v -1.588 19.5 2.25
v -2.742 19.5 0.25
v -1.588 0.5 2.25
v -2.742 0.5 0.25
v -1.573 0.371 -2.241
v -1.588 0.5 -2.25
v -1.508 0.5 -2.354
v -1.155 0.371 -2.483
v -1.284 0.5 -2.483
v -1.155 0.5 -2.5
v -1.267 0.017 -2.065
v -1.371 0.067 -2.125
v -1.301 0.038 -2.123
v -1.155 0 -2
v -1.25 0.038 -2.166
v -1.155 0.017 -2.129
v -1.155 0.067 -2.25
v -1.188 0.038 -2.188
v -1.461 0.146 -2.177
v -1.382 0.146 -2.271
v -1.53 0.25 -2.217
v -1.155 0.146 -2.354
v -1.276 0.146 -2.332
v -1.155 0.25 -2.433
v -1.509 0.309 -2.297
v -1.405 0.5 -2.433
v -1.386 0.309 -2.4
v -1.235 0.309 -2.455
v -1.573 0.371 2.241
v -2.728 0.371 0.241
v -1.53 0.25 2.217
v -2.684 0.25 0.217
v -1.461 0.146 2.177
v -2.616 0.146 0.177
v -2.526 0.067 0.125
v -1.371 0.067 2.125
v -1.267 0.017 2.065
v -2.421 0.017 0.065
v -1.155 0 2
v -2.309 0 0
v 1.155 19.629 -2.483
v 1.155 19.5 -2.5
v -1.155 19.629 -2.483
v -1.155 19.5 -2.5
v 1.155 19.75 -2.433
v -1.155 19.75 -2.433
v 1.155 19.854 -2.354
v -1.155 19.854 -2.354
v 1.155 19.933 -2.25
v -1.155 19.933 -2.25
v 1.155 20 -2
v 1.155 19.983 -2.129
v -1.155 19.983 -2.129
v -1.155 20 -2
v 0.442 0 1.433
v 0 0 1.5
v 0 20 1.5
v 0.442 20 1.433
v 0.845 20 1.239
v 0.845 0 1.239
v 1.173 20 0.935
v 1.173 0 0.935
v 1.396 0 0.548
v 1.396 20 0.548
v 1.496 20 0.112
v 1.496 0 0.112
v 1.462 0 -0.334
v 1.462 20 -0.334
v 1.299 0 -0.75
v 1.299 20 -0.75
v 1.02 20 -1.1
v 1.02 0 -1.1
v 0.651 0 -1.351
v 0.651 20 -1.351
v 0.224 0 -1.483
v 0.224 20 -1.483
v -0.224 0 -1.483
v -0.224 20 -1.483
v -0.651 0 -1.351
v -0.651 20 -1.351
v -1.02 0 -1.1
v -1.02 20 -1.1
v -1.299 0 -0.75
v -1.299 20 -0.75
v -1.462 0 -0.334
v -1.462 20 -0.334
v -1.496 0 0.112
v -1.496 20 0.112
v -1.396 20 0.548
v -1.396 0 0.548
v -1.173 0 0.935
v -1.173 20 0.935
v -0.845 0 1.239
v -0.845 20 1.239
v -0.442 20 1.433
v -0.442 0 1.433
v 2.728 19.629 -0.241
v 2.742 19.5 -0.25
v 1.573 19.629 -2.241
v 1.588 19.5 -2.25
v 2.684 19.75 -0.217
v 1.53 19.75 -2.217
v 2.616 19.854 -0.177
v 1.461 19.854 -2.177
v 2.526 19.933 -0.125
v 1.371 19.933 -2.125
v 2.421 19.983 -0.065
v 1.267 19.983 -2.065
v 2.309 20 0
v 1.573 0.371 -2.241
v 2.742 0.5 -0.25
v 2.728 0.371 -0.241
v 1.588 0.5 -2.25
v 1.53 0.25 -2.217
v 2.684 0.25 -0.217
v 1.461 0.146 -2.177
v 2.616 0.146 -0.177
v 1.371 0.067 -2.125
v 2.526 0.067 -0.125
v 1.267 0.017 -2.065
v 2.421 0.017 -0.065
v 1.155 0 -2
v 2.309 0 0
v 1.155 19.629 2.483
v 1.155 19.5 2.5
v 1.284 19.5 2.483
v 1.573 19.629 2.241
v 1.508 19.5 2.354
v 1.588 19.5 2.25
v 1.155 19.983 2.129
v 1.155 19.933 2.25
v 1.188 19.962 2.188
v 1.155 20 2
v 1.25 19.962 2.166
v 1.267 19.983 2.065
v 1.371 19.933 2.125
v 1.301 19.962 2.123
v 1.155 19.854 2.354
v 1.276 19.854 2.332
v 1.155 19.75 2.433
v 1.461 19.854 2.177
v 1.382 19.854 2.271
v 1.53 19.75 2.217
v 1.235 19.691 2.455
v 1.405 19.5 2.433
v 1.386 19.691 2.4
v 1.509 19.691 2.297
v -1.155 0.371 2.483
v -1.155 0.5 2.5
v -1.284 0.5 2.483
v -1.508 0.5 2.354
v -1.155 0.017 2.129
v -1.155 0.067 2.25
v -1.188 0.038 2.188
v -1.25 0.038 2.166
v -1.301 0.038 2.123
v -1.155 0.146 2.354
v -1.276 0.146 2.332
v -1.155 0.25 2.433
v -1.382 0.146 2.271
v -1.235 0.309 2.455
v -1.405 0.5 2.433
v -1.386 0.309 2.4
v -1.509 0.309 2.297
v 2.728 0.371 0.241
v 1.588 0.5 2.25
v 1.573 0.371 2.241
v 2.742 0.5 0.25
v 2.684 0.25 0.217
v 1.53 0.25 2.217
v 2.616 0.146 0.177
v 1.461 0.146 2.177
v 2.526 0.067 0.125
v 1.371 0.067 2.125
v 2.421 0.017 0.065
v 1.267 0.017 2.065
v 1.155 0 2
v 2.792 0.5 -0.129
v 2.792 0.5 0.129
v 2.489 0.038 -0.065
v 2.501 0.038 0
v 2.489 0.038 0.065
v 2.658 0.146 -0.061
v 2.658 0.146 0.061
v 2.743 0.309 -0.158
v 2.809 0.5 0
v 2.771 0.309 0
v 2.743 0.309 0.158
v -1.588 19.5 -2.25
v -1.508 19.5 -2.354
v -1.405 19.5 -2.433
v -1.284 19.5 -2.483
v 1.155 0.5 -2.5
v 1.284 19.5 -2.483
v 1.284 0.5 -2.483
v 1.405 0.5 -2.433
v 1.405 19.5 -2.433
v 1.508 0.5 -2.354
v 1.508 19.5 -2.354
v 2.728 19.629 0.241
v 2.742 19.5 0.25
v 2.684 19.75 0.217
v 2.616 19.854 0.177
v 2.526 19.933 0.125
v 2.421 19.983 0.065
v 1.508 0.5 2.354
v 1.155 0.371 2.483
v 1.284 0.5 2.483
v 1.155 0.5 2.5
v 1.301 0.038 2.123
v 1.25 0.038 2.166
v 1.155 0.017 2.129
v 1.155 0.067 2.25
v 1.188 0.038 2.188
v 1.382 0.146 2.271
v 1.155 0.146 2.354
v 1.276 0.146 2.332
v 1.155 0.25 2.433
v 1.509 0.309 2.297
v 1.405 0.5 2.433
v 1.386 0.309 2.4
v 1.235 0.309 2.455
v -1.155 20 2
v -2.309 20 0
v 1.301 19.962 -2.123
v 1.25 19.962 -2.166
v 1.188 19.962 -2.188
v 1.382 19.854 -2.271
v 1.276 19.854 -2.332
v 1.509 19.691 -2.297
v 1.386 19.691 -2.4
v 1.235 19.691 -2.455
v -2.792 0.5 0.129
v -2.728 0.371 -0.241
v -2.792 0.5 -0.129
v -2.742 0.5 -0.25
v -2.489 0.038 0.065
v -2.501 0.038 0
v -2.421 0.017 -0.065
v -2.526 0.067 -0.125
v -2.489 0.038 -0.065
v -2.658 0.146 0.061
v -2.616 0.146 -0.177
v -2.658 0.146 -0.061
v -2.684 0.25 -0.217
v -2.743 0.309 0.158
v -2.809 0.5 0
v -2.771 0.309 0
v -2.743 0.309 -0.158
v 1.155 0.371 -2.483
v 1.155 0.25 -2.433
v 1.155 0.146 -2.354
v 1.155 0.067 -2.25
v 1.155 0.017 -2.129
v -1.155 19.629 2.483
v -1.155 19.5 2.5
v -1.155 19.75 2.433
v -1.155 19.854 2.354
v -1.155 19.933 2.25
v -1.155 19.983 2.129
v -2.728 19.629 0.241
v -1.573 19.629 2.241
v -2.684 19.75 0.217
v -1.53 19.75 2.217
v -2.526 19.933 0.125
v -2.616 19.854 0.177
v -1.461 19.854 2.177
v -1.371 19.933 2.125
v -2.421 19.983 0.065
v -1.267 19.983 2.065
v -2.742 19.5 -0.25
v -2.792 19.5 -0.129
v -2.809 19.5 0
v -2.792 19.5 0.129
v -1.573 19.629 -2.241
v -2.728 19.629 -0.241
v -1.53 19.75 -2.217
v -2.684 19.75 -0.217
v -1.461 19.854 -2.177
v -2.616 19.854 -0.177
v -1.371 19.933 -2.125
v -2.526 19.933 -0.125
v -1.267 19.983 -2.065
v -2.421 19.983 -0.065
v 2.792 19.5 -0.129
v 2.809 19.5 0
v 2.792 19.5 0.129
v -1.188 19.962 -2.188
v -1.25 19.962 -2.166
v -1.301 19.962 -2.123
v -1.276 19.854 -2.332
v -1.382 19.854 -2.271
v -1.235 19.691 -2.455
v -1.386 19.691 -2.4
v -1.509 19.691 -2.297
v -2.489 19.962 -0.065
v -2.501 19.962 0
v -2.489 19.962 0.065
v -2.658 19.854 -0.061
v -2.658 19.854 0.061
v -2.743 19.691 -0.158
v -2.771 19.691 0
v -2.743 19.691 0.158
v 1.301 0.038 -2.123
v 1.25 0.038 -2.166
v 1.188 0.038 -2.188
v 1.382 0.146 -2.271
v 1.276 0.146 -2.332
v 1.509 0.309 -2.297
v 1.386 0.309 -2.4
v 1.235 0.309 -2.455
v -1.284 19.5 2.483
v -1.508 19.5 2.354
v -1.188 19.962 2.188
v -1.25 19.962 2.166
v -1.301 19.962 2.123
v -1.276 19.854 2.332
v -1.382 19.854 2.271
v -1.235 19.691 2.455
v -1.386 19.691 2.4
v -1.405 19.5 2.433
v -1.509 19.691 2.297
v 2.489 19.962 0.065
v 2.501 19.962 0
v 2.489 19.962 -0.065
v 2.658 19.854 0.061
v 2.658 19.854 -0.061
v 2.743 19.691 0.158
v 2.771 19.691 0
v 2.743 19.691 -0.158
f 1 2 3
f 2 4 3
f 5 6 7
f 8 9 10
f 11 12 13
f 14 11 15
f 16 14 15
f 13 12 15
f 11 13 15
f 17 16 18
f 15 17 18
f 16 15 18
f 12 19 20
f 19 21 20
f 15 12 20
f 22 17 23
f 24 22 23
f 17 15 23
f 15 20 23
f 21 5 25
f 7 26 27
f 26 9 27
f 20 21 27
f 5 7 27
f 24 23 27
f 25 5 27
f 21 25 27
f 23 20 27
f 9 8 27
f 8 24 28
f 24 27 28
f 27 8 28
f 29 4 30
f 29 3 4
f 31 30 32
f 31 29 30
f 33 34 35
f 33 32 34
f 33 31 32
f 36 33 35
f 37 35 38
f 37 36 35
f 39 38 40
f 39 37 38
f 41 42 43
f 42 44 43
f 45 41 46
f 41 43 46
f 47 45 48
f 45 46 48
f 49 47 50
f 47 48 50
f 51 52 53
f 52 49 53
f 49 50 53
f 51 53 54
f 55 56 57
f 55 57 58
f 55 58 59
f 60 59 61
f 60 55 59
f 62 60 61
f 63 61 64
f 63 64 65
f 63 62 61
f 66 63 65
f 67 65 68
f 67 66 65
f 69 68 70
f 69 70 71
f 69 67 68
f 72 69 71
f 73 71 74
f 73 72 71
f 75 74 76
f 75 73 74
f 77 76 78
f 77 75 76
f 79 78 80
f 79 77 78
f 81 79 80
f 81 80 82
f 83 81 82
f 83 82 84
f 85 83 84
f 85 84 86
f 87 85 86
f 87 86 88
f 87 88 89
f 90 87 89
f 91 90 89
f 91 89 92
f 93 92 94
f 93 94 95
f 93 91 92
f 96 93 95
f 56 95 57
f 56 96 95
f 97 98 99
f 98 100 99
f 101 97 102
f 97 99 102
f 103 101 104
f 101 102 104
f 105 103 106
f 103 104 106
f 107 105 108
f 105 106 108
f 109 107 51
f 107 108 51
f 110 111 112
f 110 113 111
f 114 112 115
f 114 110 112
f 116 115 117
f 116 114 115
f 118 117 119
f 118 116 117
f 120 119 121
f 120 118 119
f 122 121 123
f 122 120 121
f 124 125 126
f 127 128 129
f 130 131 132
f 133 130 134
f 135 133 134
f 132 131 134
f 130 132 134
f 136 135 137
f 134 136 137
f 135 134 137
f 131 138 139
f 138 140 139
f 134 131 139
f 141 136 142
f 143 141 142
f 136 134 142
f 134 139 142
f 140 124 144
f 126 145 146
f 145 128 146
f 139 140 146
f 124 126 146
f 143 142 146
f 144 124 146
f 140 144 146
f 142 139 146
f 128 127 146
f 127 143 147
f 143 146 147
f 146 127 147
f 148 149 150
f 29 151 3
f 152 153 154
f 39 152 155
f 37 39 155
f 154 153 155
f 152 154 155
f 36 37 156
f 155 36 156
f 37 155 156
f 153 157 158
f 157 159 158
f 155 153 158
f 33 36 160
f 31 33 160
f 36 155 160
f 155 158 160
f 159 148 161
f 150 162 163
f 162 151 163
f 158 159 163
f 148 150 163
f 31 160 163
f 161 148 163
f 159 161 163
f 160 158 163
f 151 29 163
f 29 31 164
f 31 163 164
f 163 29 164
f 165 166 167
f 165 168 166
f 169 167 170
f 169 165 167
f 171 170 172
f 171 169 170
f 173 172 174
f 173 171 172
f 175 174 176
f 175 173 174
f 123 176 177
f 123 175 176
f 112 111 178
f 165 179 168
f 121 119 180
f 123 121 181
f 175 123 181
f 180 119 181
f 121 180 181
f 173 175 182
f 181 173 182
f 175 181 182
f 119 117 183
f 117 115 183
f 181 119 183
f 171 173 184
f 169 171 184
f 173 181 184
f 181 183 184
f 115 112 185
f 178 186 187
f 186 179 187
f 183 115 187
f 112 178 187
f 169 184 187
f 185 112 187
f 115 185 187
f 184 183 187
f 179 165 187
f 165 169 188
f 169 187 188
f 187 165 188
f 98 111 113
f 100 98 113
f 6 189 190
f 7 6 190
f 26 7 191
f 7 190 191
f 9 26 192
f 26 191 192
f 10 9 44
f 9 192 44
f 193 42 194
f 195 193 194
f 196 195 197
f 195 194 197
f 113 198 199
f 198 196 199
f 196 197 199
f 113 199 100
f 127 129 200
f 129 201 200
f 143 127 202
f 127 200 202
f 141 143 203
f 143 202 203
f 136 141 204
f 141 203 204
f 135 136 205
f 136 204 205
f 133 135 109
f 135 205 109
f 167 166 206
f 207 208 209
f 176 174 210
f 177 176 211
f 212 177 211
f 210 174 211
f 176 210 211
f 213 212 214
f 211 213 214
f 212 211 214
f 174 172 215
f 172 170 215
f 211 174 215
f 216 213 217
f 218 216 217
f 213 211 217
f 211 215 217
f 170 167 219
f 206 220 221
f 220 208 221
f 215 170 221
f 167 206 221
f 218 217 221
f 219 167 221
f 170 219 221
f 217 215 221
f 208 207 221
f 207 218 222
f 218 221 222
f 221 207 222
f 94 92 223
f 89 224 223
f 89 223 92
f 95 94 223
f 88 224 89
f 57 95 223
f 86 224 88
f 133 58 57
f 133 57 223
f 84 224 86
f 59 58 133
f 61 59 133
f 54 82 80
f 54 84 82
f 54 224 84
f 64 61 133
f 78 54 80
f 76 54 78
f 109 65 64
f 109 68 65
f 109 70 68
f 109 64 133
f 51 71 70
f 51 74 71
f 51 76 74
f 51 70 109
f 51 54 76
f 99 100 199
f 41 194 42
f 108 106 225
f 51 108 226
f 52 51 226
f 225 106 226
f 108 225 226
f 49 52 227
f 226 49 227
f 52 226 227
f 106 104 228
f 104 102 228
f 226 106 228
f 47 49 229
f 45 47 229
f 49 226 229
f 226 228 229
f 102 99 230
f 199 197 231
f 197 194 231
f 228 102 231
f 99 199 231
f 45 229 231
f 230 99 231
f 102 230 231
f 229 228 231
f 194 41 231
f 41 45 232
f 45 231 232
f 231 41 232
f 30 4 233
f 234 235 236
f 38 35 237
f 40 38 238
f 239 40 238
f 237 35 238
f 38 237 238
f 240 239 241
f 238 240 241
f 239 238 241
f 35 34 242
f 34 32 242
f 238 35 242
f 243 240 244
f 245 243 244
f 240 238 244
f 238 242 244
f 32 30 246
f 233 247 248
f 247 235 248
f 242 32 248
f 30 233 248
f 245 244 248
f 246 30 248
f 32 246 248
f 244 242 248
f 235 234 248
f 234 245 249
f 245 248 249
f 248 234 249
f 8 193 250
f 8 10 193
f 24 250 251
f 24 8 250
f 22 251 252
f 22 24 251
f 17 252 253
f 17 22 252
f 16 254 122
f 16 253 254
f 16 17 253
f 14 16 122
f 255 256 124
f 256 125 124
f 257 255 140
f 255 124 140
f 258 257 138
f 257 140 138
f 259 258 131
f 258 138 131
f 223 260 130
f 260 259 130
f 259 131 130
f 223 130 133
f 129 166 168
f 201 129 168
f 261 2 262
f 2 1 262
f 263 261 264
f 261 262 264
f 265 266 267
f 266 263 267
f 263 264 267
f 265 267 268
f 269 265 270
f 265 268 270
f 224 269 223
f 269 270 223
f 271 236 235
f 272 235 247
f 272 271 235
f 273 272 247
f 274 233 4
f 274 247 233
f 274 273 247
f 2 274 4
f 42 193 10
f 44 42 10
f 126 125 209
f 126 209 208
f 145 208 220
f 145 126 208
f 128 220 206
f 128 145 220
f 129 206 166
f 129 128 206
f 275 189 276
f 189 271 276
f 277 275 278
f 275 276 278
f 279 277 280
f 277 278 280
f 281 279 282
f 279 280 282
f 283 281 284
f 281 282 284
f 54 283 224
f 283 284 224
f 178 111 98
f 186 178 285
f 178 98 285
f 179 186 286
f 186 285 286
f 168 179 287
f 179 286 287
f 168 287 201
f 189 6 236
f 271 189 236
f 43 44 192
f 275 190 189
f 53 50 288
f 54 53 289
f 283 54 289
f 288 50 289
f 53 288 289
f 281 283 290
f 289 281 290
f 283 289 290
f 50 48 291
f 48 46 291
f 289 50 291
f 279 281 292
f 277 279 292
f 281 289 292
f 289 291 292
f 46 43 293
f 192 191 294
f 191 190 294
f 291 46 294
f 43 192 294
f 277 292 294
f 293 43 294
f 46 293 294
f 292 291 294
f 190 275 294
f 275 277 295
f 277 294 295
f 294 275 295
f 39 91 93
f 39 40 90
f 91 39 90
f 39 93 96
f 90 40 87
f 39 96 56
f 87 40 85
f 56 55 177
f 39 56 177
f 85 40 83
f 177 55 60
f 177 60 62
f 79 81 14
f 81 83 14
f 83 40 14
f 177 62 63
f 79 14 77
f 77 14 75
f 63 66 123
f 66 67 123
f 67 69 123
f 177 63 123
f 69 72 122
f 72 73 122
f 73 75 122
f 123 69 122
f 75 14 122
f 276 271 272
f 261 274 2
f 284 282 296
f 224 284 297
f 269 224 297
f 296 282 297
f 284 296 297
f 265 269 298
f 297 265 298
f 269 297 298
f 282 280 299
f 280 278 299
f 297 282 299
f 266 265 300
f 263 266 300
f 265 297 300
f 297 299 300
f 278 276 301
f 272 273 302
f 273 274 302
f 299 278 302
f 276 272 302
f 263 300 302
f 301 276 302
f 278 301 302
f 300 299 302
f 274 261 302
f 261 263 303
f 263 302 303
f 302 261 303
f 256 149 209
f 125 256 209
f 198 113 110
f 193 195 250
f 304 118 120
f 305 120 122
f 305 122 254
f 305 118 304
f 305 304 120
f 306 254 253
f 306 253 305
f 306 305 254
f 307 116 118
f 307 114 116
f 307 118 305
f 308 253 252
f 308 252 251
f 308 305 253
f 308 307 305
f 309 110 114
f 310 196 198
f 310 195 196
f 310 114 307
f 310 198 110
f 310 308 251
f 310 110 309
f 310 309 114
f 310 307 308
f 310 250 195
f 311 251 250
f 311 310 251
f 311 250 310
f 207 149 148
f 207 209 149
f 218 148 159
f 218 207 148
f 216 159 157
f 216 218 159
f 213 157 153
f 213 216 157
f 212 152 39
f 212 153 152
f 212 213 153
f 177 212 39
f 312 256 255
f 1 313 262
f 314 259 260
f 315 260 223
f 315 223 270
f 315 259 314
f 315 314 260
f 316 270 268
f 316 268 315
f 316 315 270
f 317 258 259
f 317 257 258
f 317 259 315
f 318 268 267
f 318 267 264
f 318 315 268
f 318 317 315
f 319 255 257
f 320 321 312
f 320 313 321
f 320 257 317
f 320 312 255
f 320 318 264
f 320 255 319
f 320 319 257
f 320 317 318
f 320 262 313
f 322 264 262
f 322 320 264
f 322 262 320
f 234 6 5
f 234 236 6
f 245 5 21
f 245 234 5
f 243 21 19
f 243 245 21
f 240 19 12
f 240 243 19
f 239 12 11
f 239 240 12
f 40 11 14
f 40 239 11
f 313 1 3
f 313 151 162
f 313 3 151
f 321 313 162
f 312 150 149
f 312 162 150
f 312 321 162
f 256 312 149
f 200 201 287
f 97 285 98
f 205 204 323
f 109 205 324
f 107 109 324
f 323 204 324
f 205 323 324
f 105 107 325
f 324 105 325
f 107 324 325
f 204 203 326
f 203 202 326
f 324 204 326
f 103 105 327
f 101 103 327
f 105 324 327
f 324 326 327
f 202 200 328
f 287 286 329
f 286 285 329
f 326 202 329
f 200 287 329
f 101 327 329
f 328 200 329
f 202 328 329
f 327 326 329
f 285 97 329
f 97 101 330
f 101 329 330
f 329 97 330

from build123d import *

# Parameters (mm, degrees)
SKETCH1_R           = 1.5
BOSS_EXTRUDE1_DEPTH = 20
FILLET1_R           = 0.5


with BuildPart() as part:
    # Sketch1 → Boss-Extrude1 (new body)
    with BuildSketch(Plane(origin=(0, 0, 0), x_dir=(1, 0, 0), z_dir=(0, 1, 0))):
        Polygon((-1.443375673, 2.5), (-2.886751346, 0), (-1.443375673, -2.5), (1.443375673, -2.5), (2.886751346, 0), (1.443375673, 2.5), align=None)
        with Locations(Location((0, 0, 0), (0, 0, 270))):
            Circle(SKETCH1_R, mode=Mode.SUBTRACT)
    extrude(amount=BOSS_EXTRUDE1_DEPTH)

    # Fillet1
    fillet1_edges = [part.edges().sort_by_distance(p)[0] for p in [
        (-2.165063509, 20, 1.25),
        (1.443375673, 10, -2.5),
        (2.886751346, 10, 0),
        (1.443375673, 10, 2.5),
        (-1.443375673, 10, 2.5),
        (-2.886751346, 10, 0),
        (-1.443375673, 10, -2.5),
        (0, 20, 2.5),
        (2.165063509, 20, 1.25),
        (2.165063509, 20, -1.25),
        (0, 20, -2.5),
        (2.165063509, 0, -1.25),
        (2.165063509, 0, 1.25),
        (0, 0, 2.5),
        (-2.165063509, 20, -1.25),
        (-2.165063509, 0, 1.25),
        (-2.165063509, 0, -1.25),
        (0, 0, -2.5),
    ]]
    fillet(fillet1_edges, radius=FILLET1_R)


solid = part.part
